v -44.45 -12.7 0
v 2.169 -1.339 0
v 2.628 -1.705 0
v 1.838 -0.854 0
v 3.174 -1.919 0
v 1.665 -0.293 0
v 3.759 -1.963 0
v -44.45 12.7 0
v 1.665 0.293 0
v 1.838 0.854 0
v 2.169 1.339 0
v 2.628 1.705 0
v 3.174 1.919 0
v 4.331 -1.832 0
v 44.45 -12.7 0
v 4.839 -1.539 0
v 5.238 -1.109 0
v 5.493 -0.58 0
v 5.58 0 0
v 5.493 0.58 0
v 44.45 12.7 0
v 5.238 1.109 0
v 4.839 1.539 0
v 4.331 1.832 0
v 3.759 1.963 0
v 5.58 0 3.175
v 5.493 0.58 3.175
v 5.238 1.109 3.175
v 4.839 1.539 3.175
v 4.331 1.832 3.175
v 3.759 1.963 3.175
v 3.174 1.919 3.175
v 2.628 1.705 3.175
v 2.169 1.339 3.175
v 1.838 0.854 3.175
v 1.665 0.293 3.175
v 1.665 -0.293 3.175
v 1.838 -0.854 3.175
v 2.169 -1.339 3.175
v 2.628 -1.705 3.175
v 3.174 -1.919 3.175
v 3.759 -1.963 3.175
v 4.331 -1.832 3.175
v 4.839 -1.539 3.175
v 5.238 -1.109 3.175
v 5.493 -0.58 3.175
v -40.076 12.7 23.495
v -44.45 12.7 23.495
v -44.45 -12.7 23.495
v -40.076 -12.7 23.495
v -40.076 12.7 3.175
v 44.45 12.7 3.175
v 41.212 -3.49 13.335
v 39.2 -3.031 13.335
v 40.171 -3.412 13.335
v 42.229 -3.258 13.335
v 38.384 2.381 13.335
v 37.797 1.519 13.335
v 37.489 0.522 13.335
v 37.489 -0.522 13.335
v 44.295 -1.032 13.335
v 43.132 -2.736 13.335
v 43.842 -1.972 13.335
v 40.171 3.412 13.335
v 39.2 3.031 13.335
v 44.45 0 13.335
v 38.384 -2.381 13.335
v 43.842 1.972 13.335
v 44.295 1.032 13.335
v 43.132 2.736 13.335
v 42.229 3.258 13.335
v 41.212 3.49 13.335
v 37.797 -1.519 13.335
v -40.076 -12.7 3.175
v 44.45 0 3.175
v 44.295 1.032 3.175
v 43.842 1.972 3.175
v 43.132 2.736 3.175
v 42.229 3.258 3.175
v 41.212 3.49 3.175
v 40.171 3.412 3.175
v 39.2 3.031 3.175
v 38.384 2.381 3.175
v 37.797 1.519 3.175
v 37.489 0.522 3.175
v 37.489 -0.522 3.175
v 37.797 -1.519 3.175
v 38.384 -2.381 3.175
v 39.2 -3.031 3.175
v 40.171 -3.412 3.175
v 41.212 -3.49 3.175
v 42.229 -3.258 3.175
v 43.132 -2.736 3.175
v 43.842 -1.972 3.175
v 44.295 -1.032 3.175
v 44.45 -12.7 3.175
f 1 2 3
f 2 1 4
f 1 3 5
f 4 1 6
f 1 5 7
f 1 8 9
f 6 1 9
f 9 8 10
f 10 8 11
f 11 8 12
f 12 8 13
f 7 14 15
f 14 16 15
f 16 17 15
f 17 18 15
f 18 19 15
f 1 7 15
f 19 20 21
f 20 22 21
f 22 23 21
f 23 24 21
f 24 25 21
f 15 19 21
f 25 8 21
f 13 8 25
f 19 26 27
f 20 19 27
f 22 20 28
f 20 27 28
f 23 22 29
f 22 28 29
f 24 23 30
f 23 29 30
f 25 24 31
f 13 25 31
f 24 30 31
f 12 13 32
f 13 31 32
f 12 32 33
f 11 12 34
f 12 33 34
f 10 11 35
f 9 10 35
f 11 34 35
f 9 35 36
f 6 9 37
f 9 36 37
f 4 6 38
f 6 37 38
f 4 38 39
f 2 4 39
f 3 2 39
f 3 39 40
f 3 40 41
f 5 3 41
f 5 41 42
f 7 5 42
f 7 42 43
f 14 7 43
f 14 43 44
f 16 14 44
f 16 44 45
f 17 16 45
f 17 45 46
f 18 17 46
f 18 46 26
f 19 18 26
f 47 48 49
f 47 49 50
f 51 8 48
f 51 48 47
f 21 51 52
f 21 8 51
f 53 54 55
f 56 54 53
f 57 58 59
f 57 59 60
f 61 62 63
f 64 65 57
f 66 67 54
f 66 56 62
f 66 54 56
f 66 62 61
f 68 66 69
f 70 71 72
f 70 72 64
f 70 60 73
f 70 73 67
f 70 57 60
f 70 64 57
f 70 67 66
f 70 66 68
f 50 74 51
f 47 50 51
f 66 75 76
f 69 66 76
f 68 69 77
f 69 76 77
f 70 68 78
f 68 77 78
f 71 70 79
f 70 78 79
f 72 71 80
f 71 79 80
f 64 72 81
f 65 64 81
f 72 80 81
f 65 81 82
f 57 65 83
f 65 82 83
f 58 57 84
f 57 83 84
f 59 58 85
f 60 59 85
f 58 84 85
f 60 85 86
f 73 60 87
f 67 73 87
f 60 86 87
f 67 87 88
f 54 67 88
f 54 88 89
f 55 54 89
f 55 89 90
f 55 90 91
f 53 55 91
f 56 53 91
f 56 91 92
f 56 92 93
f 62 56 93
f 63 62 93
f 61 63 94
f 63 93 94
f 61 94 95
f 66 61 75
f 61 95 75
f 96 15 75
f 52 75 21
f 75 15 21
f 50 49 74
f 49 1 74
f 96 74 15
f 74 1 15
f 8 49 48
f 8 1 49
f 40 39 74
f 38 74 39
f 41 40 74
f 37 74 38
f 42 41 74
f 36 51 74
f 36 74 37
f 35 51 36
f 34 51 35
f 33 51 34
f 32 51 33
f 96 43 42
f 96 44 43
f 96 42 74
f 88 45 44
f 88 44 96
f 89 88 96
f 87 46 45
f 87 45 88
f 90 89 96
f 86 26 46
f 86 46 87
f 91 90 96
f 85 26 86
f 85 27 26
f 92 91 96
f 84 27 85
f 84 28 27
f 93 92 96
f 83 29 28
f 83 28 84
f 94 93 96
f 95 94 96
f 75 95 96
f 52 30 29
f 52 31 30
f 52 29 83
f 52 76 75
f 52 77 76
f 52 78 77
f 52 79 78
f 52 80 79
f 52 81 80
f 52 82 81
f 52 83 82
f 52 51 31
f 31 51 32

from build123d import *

# Parameters (mm, degrees)
F0_W     = 88.9
F0_H     = 25.4
F1_DEPTH = 3.175
F2_R     = 3.5
F3_DEPTH = 10.16
F4_R     = 1.9685
F5_DEPTH = 25.4
F6_W     = 4.374
F6_H     = 25.4
F7_DEPTH = 20.32


with BuildPart() as f1:
    # F0 (on Top) → F1 (new body)
    with BuildSketch(Plane.XY):
        Rectangle(F0_W, F0_H)
    extrude(amount=F1_DEPTH)

    # F2 (on face) → F3 (join)
    with BuildSketch(Plane.XY.offset(3.175)):
        with Locations((40.95, 0)):
            Circle(F2_R)
    extrude(amount=F3_DEPTH)

    # F4 (on face) → F5 (cut)
    with BuildSketch(Plane.XY.offset(3.175)):
        with Locations((3.612, 0)):
            Circle(F4_R)
    extrude(amount=-F5_DEPTH, mode=Mode.SUBTRACT)

    # F6 (on face) → F7 (join)
    with BuildSketch(Plane.XY.offset(3.175)):
        with Locations((-42.263, 0)):
            Rectangle(F6_W, F6_H)
    extrude(amount=F7_DEPTH)


solid = f1.part
